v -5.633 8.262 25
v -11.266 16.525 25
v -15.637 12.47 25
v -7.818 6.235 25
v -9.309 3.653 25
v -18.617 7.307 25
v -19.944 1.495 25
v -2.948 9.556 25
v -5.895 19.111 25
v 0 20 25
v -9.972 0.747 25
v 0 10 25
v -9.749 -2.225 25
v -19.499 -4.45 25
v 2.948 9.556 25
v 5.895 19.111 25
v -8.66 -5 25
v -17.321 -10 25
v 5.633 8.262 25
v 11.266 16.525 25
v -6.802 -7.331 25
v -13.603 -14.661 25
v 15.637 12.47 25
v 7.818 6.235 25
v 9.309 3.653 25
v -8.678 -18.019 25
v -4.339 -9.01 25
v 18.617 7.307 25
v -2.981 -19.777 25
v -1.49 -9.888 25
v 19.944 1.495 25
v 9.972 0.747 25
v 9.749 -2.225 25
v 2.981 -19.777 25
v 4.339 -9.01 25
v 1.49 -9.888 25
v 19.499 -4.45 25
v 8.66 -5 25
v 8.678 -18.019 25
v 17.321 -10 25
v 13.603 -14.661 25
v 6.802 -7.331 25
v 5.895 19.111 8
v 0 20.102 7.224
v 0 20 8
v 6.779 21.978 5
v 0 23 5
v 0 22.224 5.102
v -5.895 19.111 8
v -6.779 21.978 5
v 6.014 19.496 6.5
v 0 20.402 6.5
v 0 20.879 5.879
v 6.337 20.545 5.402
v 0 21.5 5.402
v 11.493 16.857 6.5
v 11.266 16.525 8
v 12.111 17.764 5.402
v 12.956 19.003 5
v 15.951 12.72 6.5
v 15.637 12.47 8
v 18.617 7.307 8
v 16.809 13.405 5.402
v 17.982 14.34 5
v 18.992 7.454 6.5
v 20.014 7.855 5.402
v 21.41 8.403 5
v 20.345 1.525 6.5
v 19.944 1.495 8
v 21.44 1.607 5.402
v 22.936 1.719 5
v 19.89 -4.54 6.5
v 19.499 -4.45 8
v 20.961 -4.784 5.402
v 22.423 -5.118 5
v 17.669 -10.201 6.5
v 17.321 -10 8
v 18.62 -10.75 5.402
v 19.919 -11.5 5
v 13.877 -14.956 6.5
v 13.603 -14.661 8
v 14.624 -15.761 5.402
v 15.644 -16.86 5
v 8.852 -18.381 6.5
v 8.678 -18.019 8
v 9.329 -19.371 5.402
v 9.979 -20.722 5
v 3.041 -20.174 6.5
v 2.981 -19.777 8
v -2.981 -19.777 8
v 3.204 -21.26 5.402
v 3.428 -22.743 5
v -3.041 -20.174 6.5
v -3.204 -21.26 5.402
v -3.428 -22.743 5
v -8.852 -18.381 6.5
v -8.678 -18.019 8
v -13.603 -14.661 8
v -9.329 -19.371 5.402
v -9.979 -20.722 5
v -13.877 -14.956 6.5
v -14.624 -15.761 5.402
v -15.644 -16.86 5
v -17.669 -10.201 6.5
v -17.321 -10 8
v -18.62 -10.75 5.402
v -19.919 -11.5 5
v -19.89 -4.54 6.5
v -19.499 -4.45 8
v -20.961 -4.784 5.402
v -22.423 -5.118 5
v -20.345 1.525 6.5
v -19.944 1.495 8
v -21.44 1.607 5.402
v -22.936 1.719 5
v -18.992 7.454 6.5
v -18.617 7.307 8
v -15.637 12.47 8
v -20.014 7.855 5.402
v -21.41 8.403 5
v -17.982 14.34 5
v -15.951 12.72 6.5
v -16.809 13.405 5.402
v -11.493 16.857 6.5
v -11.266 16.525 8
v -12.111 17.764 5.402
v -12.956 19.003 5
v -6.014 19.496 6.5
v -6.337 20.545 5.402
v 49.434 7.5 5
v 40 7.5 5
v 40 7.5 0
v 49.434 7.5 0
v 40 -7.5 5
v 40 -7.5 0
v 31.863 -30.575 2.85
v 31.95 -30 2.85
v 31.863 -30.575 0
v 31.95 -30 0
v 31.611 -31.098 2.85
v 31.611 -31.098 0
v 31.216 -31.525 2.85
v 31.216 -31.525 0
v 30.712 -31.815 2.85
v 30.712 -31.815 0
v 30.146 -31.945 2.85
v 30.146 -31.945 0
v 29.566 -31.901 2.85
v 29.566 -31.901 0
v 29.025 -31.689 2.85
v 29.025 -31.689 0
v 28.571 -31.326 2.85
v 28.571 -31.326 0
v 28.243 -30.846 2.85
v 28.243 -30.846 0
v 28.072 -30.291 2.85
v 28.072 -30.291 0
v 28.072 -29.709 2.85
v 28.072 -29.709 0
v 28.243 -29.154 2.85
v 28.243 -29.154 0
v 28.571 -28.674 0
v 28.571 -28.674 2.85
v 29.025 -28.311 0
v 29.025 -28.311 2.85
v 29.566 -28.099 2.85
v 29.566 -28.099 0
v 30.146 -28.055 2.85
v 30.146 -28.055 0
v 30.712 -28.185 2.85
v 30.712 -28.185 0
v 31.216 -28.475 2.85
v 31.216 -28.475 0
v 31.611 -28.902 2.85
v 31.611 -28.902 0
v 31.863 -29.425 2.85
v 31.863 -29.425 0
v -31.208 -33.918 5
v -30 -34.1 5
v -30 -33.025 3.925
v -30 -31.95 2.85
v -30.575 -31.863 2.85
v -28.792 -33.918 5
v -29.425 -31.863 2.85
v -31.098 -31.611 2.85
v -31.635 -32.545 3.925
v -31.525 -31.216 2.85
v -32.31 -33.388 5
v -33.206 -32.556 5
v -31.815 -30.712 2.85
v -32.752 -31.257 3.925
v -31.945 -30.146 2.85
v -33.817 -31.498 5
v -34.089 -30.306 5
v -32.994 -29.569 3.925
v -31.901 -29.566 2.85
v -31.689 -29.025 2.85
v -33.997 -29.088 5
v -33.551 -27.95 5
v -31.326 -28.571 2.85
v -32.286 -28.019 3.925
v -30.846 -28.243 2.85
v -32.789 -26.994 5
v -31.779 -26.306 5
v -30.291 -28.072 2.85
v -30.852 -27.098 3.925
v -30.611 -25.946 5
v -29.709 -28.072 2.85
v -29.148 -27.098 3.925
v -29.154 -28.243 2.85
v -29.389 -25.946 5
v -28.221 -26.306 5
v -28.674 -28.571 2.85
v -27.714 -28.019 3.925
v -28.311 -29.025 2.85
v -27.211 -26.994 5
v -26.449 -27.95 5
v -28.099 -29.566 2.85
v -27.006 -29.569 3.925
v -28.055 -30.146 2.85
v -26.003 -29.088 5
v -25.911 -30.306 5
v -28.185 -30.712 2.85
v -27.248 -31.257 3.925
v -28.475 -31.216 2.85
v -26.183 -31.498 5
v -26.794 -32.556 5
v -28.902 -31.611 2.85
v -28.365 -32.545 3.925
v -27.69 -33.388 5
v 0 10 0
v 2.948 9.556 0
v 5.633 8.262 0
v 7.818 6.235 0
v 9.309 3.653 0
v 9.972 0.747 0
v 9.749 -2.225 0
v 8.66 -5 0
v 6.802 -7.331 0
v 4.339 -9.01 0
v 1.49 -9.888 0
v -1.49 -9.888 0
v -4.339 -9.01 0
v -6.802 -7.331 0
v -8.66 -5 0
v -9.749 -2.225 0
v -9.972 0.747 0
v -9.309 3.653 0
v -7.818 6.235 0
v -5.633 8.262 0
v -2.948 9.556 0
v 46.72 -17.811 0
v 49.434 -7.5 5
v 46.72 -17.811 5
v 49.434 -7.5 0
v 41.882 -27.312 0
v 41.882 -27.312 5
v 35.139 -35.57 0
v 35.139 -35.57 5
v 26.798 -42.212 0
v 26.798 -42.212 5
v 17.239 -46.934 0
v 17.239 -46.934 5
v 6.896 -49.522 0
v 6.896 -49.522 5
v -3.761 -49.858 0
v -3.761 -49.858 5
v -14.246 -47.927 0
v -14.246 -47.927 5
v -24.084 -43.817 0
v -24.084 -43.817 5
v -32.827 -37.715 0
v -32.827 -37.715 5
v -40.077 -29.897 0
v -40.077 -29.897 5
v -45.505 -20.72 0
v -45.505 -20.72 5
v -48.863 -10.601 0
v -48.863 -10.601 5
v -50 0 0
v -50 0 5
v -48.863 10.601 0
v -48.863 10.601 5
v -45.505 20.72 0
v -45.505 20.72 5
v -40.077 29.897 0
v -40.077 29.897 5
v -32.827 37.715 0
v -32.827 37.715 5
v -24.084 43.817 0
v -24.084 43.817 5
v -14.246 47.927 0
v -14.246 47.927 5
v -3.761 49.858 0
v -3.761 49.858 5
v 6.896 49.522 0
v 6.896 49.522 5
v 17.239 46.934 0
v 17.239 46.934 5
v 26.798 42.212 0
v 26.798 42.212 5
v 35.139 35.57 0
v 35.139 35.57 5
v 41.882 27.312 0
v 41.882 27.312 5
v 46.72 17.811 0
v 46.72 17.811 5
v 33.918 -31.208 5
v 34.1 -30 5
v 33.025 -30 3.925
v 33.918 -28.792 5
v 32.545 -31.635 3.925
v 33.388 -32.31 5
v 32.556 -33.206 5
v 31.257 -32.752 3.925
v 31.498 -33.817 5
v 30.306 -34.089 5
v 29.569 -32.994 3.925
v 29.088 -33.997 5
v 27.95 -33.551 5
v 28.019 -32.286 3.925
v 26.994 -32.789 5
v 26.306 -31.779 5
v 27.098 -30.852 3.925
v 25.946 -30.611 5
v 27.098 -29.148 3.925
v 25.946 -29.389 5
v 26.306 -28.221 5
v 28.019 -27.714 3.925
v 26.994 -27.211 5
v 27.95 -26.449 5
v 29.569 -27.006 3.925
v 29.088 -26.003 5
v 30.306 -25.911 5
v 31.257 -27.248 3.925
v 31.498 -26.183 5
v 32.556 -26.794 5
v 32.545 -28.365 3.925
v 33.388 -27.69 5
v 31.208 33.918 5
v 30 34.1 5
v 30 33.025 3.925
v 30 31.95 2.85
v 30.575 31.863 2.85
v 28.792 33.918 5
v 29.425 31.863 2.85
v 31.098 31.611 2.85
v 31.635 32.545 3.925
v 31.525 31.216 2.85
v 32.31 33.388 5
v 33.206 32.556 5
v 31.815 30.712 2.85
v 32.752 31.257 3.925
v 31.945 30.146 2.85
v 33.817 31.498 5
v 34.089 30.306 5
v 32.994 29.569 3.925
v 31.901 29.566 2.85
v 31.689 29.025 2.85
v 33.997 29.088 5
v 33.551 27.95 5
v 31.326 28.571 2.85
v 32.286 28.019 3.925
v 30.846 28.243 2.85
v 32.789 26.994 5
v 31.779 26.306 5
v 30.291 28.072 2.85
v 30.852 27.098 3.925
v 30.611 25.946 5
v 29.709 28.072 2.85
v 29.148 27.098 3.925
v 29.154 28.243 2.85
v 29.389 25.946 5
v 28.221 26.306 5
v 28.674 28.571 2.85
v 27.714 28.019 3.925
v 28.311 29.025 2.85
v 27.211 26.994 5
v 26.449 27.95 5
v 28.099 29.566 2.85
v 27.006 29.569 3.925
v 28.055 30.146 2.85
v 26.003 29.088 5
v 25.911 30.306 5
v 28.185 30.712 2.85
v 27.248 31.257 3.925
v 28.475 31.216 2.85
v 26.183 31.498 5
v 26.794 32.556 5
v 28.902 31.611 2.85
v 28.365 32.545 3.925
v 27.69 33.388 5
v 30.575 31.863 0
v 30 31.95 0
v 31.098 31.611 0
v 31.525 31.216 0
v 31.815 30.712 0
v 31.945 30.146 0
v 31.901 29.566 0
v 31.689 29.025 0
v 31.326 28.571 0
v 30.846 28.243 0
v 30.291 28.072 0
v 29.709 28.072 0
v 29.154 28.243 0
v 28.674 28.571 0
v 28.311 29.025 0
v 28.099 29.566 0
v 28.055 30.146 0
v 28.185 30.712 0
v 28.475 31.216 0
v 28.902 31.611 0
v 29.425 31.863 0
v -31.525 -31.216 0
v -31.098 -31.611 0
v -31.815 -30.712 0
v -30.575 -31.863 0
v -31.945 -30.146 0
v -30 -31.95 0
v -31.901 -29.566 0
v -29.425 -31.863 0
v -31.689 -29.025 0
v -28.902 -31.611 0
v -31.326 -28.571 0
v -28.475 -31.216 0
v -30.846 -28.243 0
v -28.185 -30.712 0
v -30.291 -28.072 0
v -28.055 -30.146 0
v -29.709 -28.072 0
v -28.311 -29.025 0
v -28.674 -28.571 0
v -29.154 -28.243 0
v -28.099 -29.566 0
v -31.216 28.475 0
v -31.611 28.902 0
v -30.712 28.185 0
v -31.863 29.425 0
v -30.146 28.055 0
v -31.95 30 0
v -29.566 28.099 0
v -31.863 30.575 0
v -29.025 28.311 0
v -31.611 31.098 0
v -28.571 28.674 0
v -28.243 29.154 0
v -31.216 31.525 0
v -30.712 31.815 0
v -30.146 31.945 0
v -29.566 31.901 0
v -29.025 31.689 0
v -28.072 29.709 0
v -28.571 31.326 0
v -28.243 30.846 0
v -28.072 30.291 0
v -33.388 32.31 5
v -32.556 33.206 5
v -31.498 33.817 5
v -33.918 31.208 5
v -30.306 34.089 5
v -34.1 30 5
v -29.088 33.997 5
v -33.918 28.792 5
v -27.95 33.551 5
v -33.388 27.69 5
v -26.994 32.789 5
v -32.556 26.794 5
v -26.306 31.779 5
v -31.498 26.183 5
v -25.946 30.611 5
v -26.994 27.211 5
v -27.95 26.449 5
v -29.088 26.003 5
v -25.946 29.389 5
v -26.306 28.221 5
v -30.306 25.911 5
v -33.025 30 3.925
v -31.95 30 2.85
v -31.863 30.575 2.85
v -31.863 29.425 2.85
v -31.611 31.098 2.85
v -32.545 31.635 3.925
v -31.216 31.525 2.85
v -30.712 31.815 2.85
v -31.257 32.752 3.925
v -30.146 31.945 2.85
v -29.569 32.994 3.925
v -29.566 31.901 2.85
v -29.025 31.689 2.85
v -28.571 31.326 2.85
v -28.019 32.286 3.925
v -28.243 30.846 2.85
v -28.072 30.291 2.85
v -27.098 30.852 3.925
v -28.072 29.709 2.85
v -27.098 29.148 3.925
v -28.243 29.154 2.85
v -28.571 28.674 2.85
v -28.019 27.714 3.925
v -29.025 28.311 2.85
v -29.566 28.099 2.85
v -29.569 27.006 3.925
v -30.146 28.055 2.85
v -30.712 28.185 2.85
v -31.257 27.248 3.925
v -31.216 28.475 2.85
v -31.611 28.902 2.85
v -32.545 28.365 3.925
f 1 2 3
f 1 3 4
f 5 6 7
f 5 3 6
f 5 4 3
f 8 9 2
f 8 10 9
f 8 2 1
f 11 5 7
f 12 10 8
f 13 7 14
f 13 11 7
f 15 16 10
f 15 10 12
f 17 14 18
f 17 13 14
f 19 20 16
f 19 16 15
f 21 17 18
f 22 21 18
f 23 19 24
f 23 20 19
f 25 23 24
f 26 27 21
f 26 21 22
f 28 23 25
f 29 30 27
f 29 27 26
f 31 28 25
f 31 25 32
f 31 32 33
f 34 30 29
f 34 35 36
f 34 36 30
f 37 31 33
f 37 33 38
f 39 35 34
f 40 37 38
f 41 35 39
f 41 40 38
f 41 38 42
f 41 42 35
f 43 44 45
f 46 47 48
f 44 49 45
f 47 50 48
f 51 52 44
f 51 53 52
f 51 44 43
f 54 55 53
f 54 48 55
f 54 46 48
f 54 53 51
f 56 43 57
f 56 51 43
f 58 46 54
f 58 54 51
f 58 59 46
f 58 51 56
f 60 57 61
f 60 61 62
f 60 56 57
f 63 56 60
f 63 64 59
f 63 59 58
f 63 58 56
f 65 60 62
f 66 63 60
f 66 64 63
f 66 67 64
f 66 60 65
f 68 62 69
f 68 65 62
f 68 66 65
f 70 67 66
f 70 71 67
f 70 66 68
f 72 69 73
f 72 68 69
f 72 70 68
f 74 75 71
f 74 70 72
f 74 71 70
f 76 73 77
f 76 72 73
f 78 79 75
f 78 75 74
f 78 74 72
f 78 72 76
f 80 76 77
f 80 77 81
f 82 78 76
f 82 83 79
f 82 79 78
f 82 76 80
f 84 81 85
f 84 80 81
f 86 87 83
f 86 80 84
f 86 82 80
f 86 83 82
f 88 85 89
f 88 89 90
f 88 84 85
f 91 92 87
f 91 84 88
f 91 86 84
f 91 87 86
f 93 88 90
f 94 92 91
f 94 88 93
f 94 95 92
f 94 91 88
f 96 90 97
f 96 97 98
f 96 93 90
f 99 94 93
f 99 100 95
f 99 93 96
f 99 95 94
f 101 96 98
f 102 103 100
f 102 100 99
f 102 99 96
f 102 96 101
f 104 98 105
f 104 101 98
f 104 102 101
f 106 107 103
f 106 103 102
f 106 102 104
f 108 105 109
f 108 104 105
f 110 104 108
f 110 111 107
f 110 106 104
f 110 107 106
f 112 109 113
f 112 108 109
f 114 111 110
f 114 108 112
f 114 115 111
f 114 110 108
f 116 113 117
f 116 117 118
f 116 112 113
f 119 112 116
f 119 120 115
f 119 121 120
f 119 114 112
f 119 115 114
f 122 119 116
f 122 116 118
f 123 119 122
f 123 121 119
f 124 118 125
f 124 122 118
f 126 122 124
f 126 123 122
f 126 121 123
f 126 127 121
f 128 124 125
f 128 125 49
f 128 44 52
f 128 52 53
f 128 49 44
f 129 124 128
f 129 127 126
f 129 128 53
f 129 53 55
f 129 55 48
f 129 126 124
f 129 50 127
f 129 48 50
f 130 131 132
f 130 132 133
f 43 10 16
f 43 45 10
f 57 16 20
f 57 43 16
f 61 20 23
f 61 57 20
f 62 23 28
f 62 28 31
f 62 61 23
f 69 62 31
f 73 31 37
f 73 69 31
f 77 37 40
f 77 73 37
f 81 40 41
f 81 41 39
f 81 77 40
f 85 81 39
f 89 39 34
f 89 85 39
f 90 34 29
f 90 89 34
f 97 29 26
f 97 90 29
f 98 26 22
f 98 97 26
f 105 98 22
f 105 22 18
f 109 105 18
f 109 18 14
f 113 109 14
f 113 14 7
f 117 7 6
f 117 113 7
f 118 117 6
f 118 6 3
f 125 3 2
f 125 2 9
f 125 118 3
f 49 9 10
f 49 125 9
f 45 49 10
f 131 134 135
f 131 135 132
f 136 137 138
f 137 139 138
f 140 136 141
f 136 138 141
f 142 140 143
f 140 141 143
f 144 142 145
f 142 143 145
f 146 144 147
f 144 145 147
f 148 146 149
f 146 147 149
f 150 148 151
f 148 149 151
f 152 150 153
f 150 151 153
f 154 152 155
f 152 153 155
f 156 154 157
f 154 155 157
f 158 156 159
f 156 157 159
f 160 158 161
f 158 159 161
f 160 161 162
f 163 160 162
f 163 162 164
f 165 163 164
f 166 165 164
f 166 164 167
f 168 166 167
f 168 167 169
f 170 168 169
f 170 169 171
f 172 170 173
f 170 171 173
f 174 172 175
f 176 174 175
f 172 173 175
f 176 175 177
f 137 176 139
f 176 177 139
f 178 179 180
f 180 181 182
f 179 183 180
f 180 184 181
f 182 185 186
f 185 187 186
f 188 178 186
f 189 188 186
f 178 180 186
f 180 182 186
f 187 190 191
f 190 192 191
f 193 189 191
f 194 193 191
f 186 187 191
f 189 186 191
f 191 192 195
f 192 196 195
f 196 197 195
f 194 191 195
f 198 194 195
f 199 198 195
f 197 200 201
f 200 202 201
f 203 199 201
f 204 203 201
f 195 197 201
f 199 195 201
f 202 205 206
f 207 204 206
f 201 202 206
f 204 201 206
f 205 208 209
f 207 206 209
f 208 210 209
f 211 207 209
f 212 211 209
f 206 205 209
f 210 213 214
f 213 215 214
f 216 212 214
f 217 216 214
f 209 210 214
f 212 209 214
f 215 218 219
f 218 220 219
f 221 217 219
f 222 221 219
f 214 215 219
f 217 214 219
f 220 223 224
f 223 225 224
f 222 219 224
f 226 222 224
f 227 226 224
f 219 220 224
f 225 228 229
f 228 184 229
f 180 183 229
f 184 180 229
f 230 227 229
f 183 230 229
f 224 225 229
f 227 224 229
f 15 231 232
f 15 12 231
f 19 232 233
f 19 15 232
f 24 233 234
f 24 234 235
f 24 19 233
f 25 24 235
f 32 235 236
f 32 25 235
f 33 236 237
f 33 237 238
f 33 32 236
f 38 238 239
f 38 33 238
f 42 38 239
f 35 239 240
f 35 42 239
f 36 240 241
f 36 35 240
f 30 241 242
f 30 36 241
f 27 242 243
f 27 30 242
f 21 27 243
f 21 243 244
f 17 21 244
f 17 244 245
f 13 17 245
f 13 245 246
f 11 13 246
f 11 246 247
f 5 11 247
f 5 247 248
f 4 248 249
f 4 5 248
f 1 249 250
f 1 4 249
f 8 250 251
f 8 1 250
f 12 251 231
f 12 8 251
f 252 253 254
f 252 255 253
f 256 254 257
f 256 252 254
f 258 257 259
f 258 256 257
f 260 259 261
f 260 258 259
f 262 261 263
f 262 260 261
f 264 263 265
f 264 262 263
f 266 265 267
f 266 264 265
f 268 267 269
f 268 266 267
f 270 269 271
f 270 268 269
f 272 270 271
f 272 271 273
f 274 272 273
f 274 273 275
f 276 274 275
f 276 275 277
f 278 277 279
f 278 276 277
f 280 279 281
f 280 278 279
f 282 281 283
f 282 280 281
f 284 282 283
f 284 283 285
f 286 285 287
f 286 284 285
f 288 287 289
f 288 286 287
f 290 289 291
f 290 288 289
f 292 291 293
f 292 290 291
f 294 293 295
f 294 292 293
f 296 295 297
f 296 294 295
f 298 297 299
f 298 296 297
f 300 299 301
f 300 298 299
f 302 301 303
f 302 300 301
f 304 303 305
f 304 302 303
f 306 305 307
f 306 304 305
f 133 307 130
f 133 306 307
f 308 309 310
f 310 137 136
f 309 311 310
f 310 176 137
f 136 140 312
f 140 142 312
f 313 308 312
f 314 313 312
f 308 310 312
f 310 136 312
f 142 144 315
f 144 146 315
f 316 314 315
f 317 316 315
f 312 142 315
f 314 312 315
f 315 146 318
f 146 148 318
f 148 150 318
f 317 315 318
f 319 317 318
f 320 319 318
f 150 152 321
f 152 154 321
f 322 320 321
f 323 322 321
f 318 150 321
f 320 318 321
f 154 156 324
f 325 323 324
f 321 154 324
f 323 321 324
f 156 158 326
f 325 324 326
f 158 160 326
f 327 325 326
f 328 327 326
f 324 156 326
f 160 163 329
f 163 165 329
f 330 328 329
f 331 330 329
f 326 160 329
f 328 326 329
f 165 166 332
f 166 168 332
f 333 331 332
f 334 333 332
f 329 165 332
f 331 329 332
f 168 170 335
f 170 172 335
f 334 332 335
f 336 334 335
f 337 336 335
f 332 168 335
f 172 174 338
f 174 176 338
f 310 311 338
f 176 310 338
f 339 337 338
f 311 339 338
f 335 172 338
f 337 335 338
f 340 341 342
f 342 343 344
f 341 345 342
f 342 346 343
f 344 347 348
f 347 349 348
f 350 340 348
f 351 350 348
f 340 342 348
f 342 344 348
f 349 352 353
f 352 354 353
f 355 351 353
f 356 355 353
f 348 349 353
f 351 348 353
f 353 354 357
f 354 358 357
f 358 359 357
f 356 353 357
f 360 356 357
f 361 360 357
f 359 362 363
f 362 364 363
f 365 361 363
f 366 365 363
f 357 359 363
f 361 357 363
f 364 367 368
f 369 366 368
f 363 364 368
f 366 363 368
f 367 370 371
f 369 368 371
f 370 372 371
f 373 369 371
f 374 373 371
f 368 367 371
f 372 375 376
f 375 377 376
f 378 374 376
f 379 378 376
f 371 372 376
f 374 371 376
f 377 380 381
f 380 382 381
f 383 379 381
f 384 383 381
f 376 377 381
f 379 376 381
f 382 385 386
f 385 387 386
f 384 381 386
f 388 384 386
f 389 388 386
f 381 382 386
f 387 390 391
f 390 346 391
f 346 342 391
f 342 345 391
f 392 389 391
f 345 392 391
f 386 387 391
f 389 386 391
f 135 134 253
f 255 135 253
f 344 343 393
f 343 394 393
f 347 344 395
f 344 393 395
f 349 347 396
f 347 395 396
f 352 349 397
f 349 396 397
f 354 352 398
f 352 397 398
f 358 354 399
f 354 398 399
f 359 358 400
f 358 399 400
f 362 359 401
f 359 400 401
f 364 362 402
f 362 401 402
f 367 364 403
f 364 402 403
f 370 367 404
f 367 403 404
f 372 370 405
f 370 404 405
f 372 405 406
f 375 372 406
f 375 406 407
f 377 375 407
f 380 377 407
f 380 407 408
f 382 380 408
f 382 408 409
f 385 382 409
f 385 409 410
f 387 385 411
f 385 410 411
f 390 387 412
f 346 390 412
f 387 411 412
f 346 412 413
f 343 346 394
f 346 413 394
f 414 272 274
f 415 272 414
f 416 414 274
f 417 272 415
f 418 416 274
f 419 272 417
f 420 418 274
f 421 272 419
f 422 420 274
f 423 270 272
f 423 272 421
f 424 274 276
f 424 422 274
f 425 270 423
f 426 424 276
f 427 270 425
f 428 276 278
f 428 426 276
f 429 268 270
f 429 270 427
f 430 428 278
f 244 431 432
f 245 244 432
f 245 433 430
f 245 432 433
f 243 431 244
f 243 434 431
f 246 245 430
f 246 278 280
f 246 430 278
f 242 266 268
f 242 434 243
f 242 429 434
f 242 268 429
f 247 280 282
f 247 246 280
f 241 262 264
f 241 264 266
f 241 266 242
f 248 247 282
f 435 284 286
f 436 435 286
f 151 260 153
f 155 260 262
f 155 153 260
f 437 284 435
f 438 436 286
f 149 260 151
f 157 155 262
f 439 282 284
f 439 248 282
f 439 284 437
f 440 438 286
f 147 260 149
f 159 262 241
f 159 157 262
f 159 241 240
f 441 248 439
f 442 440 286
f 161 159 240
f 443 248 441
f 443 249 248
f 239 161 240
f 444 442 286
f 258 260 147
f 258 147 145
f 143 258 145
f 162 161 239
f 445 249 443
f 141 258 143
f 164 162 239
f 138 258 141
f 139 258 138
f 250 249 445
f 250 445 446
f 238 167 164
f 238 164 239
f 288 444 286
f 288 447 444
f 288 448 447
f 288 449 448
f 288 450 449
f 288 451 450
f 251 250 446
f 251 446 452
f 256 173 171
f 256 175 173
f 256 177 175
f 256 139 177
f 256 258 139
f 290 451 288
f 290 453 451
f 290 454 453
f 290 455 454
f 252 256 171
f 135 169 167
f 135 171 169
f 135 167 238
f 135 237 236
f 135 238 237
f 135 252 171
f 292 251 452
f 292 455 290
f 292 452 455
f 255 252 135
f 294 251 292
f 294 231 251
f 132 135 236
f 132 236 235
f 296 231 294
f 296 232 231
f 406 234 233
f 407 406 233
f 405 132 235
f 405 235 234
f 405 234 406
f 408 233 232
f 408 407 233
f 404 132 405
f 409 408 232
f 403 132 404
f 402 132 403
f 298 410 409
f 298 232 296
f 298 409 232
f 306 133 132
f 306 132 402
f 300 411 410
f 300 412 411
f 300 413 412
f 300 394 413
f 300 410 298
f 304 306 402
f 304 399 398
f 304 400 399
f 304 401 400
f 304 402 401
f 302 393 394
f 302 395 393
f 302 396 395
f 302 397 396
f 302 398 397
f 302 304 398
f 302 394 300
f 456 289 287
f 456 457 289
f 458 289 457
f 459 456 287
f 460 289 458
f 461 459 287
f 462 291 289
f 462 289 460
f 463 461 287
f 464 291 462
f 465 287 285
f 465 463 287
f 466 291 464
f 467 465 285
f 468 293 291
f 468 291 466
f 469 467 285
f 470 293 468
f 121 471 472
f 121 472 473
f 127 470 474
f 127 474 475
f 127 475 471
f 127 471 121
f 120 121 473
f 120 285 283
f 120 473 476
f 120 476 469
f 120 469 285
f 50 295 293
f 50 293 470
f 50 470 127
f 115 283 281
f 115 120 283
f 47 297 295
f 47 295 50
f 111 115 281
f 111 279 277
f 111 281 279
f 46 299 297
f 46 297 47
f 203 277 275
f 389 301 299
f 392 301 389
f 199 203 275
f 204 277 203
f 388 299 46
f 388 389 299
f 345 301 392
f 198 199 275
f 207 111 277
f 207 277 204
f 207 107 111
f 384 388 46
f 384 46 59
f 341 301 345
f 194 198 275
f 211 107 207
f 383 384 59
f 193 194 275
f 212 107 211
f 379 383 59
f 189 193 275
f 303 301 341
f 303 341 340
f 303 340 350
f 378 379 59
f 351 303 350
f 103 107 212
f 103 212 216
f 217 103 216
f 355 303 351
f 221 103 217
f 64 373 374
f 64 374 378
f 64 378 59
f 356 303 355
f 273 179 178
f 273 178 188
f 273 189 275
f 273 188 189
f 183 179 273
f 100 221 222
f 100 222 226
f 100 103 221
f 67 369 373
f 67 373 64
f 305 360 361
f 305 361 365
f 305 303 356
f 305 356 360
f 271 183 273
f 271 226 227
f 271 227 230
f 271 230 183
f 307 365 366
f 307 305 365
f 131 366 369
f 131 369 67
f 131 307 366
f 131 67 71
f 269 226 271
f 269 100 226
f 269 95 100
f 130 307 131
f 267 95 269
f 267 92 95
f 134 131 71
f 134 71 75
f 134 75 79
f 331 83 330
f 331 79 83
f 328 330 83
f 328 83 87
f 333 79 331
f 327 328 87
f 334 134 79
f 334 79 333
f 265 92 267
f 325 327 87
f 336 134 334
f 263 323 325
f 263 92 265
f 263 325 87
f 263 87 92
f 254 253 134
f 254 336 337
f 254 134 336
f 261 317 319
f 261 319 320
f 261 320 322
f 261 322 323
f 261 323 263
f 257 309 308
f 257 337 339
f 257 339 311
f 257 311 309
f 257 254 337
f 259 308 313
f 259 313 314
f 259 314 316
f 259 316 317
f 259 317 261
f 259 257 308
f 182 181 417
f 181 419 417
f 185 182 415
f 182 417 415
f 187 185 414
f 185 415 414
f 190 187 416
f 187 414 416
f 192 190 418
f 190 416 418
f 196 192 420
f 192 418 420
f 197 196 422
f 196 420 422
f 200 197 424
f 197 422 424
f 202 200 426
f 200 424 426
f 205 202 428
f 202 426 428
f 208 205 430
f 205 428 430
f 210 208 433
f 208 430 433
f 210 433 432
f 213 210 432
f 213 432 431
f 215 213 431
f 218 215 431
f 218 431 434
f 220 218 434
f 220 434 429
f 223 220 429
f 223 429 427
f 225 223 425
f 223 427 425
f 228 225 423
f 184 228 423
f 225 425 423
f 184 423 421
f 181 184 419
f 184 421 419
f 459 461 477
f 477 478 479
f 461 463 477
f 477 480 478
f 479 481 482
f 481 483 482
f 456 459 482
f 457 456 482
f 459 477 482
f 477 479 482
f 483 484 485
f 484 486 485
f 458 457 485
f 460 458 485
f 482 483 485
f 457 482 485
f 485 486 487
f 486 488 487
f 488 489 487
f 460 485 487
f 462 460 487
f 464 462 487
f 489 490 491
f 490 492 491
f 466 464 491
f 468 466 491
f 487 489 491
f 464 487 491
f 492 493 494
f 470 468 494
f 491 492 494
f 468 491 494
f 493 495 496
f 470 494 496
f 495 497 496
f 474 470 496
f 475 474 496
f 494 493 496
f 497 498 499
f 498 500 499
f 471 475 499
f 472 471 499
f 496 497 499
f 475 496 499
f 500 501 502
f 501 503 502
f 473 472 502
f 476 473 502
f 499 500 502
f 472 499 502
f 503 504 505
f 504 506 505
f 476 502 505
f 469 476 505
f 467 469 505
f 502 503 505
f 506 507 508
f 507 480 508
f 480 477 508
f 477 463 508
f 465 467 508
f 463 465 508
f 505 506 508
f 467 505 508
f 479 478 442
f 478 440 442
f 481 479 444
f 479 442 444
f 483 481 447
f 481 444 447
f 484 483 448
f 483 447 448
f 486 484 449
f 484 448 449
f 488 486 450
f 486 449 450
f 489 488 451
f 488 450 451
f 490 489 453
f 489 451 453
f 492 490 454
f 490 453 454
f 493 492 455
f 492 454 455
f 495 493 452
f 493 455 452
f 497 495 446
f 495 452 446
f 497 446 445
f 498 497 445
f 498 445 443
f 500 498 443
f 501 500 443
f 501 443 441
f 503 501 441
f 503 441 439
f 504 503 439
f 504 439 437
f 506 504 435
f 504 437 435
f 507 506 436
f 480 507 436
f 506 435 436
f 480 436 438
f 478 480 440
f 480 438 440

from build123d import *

# Parameters (mm, degrees)
SKETCH5_W                                         = 10
SKETCH5_H                                         = 15
EXTRUDE2_DEPTH                                    = 6
CSK_FOR_M3_5_FLAT_HEAD_MACHINE_SCREW1_D           = 3.9
CSK_FOR_M3_5_FLAT_HEAD_MACHINE_SCREW1_CSINK_D     = 8.2
CSK_FOR_M3_5_FLAT_HEAD_MACHINE_SCREW1_CSINK_ANGLE = 90
CIRPATTERN1_COUNT                                 = 4


with BuildPart() as part:
    # Sketch1 → Revolve1 (revolve)
    with BuildSketch(Plane(origin=(0, 0, 0), x_dir=(0, 0, -1), z_dir=(1, 0, 0))):
        with BuildLine():
            Line((0, 10), (-25, 10))
            Line((-25, 10), (-25, 20))
            Line((-25, 20), (-8, 20))
            ThreePointArc((-8, 20), (-5.878679656, 20.878679656), (-5, 23))
            Line((-5, 23), (-5, 50))
            Line((-5, 50), (0, 50))
            Line((0, 50), (0, 10))
        make_face()
    revolve(axis=Axis((0, 0, 50), (0, 0, -1)))

    # Sketch5 → Extrude2 (cut, through all)
    with BuildSketch(Plane.XY.offset(5)):
        with Locations((45, 0)):
            Rectangle(SKETCH5_W, SKETCH5_H)
    extrude(amount=-EXTRUDE2_DEPTH, mode=Mode.SUBTRACT)

    # CSK for M3.5 Flat Head Machine Screw1 (through all)
    with Locations(Plane.XY.offset(5)):
        with Locations((-30, 30)):
            csk_for_m3_5_flat_head_machine_screw1 = CounterSinkHole(CSK_FOR_M3_5_FLAT_HEAD_MACHINE_SCREW1_D / 2, CSK_FOR_M3_5_FLAT_HEAD_MACHINE_SCREW1_CSINK_D / 2, counter_sink_angle=CSK_FOR_M3_5_FLAT_HEAD_MACHINE_SCREW1_CSINK_ANGLE)

    # CirPattern1: CSK for M3.5 Flat Head Machine Screw1 ×4 about axis
    cirpattern1_axis = Axis((0, 0, 0), (0, 0, 1))
    for i in range(1, CIRPATTERN1_COUNT):
        add(csk_for_m3_5_flat_head_machine_screw1.rotate(cirpattern1_axis, i * 360 / CIRPATTERN1_COUNT), mode=Mode.SUBTRACT)


solid = part.part
